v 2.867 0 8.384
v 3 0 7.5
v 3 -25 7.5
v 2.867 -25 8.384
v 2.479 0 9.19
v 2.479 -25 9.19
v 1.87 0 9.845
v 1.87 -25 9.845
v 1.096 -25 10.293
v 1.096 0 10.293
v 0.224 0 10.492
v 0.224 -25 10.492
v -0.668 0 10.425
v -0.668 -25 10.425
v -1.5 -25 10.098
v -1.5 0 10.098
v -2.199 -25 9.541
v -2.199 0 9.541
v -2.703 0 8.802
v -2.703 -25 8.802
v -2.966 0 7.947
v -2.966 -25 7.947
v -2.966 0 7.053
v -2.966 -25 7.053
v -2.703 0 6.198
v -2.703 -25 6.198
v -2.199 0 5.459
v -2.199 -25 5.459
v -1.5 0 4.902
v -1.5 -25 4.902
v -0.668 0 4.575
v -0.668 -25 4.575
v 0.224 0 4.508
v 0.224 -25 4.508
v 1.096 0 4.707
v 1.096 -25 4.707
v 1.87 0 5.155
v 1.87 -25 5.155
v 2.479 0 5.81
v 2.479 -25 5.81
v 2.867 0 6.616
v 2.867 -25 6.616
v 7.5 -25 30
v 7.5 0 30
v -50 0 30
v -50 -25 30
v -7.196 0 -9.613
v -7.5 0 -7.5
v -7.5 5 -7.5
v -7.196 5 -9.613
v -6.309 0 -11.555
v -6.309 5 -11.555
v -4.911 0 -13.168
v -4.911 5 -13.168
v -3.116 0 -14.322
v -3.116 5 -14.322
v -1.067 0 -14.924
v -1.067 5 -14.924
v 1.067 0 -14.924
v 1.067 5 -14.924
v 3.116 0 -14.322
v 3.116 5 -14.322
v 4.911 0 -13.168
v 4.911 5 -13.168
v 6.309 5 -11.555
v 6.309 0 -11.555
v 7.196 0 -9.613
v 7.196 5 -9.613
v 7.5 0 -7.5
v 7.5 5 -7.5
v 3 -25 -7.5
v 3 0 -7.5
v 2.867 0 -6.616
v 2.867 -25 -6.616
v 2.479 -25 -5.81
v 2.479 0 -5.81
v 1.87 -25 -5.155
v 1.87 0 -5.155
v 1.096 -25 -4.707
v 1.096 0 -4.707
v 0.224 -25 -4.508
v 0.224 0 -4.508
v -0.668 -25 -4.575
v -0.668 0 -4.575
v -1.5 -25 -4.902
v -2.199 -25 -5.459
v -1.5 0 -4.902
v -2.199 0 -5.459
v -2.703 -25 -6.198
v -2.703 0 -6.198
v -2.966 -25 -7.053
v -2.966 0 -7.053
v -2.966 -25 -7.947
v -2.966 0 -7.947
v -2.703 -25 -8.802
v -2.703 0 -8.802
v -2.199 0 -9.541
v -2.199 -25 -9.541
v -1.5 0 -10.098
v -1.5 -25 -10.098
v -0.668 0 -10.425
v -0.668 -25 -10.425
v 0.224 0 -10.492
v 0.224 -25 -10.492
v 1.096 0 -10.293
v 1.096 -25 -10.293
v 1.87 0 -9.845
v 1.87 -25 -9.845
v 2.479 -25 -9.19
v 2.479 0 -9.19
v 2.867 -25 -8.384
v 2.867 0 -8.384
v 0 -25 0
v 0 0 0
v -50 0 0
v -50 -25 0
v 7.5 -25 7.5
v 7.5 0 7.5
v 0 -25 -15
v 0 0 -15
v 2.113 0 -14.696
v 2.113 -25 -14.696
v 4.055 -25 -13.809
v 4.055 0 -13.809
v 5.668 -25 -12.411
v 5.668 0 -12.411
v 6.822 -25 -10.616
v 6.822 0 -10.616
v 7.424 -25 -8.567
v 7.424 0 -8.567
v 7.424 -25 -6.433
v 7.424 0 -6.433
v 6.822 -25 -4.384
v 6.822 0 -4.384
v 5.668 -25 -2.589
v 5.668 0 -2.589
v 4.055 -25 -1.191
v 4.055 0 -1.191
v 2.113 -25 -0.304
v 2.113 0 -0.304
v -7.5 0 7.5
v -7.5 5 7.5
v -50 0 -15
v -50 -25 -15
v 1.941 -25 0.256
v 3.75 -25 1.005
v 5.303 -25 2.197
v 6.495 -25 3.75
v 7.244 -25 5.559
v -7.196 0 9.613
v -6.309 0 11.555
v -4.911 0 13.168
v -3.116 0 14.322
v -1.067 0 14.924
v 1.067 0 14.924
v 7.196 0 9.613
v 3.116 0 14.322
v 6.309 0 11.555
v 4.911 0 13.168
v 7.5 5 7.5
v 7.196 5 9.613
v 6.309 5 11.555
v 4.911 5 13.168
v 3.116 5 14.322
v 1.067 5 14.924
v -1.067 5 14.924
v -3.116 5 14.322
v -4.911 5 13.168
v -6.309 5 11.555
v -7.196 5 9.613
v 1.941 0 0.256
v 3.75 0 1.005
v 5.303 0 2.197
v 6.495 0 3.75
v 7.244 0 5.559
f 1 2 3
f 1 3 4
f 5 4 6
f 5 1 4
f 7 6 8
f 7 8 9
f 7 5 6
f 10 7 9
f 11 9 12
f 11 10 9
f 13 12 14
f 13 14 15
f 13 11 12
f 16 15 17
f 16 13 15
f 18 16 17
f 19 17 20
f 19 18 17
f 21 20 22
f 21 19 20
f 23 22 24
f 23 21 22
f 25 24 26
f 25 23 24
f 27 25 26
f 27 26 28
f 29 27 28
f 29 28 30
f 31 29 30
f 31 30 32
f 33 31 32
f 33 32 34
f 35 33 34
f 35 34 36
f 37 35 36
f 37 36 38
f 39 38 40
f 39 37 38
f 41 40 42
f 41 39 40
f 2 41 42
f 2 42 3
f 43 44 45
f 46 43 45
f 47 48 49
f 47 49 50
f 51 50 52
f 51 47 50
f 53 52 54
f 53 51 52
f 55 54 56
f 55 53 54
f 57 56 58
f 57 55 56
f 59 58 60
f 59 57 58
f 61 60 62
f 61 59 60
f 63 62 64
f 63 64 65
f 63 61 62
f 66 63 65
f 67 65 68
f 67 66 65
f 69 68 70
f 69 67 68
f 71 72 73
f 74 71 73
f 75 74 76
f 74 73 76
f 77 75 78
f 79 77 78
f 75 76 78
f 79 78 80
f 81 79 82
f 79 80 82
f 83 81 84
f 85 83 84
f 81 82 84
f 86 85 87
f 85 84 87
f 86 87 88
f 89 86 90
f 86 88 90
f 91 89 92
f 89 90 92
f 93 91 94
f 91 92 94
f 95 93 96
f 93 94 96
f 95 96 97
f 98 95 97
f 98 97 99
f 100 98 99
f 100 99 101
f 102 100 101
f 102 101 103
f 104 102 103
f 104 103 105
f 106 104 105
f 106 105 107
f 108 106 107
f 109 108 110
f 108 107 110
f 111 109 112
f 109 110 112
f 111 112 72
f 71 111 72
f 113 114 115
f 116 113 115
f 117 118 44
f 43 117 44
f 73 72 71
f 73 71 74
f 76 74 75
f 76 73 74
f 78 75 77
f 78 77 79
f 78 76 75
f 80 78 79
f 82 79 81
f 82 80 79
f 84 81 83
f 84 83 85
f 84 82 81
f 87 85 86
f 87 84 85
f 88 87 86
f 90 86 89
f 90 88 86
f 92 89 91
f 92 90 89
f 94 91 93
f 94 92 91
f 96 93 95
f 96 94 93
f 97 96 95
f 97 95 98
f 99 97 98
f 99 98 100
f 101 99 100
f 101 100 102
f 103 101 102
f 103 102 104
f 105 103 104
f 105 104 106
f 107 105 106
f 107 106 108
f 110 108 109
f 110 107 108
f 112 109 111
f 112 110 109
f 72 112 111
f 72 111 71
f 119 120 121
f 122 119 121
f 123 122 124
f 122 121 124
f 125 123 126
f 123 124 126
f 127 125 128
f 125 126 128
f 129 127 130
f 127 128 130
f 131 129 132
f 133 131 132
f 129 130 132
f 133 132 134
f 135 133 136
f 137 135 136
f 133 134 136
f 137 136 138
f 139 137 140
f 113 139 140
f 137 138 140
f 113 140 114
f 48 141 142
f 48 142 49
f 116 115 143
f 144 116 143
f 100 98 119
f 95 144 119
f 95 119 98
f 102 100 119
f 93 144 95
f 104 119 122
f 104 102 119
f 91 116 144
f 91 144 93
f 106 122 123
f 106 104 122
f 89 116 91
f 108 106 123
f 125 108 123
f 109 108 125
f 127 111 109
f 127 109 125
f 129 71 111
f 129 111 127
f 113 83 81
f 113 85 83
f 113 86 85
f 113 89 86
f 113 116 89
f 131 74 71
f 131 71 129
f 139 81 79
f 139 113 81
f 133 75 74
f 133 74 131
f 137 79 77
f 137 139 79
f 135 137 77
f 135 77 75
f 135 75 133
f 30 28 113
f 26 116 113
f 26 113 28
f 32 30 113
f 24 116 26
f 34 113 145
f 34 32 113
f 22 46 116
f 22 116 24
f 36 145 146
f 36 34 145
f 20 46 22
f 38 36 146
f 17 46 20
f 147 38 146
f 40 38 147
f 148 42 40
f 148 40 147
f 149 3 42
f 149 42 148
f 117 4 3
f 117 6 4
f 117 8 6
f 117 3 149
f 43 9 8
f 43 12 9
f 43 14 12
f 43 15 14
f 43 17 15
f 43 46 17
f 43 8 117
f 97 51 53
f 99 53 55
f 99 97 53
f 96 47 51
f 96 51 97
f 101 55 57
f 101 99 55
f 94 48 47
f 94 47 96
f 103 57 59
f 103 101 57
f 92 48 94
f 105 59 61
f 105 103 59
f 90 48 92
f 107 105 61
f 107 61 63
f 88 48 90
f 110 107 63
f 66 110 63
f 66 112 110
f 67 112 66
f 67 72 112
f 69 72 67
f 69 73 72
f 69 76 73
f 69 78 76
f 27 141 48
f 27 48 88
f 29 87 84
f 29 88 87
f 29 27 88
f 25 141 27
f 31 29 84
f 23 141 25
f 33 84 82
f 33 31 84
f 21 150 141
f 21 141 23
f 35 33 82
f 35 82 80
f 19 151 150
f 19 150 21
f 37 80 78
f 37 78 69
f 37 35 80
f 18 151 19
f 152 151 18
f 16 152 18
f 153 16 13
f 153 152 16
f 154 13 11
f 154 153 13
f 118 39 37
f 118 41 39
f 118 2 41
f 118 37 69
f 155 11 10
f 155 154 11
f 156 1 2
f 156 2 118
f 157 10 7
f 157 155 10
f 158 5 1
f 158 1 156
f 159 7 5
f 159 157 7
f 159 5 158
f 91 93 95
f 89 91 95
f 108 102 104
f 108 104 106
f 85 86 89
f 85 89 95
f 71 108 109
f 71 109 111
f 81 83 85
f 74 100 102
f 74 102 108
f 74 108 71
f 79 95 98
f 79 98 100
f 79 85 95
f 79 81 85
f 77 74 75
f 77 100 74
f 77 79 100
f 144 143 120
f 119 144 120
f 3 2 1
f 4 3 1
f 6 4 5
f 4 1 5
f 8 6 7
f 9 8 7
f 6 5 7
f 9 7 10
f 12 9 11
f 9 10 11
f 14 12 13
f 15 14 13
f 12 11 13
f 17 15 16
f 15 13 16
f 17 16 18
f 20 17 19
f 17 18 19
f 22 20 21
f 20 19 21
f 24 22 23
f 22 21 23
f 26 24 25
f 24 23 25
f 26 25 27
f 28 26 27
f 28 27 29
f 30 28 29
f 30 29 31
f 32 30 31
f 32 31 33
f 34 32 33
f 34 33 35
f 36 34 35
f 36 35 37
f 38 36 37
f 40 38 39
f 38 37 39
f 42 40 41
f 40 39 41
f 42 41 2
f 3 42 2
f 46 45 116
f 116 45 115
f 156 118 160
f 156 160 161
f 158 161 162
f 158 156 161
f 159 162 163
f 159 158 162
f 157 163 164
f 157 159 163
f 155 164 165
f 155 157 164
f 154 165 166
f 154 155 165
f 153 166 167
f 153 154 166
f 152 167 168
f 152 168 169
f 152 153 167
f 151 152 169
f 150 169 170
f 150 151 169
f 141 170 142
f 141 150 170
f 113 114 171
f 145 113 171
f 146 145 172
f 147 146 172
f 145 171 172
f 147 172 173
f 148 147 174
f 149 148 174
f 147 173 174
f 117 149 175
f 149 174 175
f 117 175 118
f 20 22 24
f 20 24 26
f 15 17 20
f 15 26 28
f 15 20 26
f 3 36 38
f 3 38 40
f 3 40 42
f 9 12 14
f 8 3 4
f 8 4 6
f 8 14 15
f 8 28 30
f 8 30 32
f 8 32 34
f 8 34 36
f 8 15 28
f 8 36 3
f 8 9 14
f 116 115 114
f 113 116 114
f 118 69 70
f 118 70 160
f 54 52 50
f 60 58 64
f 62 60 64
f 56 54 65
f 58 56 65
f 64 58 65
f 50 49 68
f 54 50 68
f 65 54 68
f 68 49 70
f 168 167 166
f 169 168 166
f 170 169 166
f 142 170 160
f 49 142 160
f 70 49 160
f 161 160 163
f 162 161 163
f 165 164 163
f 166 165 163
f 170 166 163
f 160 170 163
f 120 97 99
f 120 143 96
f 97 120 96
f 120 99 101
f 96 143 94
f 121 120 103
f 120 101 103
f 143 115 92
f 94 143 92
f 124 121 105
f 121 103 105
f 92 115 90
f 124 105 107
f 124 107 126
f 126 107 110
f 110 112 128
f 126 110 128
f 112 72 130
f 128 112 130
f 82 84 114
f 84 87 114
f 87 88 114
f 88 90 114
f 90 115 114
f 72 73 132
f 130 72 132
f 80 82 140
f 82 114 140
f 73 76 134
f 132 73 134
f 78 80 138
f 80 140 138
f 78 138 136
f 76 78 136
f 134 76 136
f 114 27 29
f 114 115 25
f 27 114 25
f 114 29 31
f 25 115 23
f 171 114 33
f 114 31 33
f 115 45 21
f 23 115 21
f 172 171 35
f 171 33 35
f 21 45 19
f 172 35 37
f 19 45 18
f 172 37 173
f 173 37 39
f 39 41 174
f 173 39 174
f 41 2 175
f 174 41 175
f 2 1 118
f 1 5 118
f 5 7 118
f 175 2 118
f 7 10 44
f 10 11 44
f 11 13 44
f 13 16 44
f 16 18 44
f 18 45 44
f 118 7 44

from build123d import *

# Parameters (mm, degrees)
F0_R     = 3
F1_DEPTH = 25
F2_DEPTH = 25
F3_DEPTH = 25
F5_DEPTH = 5


# Not quite as in the source:
# - a feature names something its author has since deleted; it is built from what else it names


with BuildPart() as f1:
    # F0 (on Front) → F1 (new body)
    with BuildSketch(Plane.XZ):
        with BuildLine():
            Line((-50, 0), (0, 0))
            ThreePointArc((0, 0), (5.3033008589, 2.1966991411), (7.5, 7.5))
            Line((7.5, 7.5), (7.5, 30))
            Line((7.5, 30), (-50, 30))
            Line((-50, 30), (-50, 15))
            Line((-50, 15), (-50, 0))
        make_face()
        with Locations((0, 7.5)):
            Circle(F0_R, mode=Mode.SUBTRACT)
    extrude(amount=F1_DEPTH)


with BuildPart() as f2:
    # F0 (on Front) → F2 (new body)
    with BuildSketch(Plane.XZ):
        with BuildLine():
            ThreePointArc((0, -15), (7.5, -7.5), (0, 0))
            Line((0, 0), (-50, 0))
            Line((-50, 0), (-50, -15))
            Line((-50, -15), (0, -15))
        make_face()
        with Locations((0, -7.5)):
            Circle(F0_R, mode=Mode.SUBTRACT)
    extrude(amount=F2_DEPTH)


with BuildPart() as f3:
    # F0 (on Front) → F3 (new body)
    with BuildSketch(Plane.XZ):
        with Locations((0, 7.5)):
            Circle(F0_R)
    extrude(amount=F3_DEPTH)



with BuildPart() as f3b:
    # F0 (on Front) → F3, piece 2 (new body)
    with BuildSketch(Plane.XZ):
        with Locations((0, -7.5)):
            Circle(F0_R)
    extrude(amount=F3_DEPTH)


with BuildPart() as f3_1:
    add(f3.part)

    add(f3b.part)  # F5 merges F3b
    # F4 (on Front) → F5 (join)
    with BuildSketch(Plane.XZ):
        with BuildLine():
            ThreePointArc((7.5, 7.5), (5.3033008589, 12.8033008589), (0, 15))
            ThreePointArc((0, 15), (-5.3033008589, 12.8033008589), (-7.5, 7.5))
            Line((-7.5, 7.5), (-7.5, -7.5))
            ThreePointArc((-7.5, -7.5), (-5.3033008589, -12.8033008589), (0, -15))
            ThreePointArc((0, -15), (5.3033008589, -12.8033008589), (7.5, -7.5))
            Line((7.5, -7.5), (7.5, 7.5))
        make_face()
    extrude(amount=-F5_DEPTH)


solid = Compound([f1.part, f2.part, f3_1.part])
